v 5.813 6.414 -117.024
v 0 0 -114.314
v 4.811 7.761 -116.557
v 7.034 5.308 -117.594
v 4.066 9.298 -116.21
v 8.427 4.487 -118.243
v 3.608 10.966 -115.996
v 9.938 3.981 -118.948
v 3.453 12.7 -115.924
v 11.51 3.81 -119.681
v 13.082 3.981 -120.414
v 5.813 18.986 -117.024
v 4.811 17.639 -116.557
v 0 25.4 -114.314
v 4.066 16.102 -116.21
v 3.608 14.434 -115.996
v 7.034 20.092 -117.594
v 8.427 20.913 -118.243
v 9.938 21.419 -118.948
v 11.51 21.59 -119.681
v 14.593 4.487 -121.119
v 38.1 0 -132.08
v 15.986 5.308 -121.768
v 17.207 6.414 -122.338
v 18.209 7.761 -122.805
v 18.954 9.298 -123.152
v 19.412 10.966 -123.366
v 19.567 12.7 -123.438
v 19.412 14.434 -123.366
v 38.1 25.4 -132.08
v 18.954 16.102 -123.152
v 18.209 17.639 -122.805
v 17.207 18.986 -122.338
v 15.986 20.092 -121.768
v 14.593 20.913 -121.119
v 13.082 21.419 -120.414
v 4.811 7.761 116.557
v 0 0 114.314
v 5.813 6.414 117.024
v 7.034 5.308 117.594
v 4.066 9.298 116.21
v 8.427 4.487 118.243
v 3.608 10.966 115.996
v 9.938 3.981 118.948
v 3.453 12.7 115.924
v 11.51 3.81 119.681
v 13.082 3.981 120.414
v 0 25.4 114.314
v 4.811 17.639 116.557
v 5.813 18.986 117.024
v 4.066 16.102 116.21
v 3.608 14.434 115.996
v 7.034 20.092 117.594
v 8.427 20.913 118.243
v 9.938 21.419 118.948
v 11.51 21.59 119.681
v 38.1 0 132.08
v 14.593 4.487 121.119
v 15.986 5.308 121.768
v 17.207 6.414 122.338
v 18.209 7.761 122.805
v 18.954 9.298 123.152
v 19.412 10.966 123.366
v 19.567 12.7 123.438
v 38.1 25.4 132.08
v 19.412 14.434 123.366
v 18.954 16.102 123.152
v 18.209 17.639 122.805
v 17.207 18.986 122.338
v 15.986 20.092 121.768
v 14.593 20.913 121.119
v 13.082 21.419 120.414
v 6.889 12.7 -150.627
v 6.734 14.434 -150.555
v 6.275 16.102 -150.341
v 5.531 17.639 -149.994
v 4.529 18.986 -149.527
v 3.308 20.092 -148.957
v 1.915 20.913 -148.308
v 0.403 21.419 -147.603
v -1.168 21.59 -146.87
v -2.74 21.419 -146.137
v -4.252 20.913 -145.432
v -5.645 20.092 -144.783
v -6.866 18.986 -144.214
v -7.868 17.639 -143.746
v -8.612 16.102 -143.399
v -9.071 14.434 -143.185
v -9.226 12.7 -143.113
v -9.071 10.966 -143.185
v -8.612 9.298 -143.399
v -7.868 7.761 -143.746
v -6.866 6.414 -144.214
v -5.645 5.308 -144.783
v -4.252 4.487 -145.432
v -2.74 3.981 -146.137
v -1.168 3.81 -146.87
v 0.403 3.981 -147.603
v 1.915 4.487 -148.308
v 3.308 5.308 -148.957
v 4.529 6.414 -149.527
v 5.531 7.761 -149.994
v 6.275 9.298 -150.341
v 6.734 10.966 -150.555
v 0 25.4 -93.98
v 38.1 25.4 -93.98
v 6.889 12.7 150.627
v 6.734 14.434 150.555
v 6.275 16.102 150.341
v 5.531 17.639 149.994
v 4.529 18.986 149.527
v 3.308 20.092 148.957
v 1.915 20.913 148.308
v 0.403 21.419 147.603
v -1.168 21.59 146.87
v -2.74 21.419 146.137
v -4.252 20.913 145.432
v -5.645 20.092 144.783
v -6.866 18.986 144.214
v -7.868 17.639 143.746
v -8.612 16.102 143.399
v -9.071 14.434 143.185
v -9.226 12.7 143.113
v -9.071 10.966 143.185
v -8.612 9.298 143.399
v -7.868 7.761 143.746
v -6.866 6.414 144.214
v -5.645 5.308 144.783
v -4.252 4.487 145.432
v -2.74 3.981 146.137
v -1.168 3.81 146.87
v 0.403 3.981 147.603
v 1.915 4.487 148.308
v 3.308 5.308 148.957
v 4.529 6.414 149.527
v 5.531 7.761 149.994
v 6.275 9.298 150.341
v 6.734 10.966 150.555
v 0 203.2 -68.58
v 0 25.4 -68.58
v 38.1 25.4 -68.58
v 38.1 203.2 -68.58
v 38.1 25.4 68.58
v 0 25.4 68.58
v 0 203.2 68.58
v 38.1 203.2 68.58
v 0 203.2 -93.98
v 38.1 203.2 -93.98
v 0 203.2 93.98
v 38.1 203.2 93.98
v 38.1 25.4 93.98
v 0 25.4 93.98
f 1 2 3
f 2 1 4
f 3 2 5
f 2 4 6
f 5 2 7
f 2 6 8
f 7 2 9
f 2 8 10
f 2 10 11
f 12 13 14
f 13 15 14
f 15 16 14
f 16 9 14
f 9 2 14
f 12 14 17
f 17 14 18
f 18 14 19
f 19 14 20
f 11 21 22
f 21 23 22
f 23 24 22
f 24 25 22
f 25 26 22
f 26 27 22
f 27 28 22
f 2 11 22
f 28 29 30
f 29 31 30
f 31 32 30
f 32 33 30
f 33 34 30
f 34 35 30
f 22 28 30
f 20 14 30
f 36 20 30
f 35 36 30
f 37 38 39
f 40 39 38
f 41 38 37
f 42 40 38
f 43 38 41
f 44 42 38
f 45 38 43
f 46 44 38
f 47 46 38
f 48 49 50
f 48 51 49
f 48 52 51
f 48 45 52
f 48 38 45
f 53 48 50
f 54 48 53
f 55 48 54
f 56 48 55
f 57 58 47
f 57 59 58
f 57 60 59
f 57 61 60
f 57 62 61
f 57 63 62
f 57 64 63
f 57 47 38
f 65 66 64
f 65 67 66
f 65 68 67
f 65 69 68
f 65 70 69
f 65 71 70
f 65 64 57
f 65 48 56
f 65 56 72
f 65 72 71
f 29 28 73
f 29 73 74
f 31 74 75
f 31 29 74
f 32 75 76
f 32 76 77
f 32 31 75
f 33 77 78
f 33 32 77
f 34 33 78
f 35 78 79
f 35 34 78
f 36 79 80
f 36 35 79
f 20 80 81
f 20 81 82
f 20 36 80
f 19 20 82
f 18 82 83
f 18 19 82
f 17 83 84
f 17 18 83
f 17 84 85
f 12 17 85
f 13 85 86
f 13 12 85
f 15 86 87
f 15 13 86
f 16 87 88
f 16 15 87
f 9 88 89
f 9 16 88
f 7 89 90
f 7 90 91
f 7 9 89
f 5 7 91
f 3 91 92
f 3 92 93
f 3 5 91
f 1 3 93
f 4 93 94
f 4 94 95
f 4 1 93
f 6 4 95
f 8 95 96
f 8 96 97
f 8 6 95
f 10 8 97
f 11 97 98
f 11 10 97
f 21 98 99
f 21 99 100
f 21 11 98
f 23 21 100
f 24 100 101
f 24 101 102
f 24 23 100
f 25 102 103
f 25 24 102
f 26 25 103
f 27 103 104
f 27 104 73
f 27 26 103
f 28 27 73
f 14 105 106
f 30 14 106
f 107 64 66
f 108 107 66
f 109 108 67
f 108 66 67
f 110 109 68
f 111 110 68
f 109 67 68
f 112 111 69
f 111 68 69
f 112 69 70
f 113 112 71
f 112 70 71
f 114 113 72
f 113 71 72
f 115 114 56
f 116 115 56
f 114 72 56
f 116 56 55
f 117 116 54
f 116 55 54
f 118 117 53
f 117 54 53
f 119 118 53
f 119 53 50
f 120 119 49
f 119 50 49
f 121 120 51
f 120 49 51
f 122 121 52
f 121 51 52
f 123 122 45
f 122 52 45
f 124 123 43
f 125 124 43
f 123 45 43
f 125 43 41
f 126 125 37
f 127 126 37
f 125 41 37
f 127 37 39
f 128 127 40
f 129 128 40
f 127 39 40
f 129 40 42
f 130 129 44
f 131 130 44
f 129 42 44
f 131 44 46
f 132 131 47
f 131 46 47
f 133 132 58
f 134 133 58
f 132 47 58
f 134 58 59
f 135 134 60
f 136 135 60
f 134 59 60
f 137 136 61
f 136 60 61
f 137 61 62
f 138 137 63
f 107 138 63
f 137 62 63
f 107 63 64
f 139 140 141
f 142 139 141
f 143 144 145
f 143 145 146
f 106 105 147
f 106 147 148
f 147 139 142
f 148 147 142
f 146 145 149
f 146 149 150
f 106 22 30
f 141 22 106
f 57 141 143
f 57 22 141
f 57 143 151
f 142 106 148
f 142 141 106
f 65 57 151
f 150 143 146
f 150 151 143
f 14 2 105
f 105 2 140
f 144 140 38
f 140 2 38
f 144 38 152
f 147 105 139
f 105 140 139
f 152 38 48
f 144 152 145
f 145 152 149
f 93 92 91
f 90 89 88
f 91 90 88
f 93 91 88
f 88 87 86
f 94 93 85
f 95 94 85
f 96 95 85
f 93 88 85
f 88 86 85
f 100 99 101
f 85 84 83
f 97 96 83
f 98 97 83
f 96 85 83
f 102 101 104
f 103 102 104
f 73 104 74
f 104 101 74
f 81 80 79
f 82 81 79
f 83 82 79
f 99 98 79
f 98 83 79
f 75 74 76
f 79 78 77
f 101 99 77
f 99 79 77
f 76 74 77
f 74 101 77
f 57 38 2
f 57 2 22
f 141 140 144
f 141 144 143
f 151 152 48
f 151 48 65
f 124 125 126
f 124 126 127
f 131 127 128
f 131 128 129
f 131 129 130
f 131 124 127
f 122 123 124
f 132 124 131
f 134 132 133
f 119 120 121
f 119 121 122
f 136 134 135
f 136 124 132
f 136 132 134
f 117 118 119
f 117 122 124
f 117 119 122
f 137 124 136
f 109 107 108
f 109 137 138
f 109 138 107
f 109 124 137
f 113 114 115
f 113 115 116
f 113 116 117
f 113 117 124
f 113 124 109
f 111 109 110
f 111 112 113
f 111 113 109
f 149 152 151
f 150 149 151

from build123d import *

# Parameters (mm, degrees)
SKETCH1_W           = 38.1
SKETCH1_H           = 25.4
BOSS_EXTRUDE1_DEPTH = 132.08
SKETCH5_W           = 38.1
SKETCH5_H           = 25.4
BOSS_EXTRUDE3_DEPTH = 177.8
CUT_EXTRUDE1_DEPTH  = 25.4
SKETCH3_R           = 8.89
BOSS_EXTRUDE2_DEPTH = 30


with BuildPart() as part:
    # Sketch1 → Boss-Extrude1 (new body)
    with BuildSketch(Plane.XY):
        with Locations((19.05, 12.7)):
            Rectangle(SKETCH1_W, SKETCH1_H)
    boss_extrude1 = extrude(amount=BOSS_EXTRUDE1_DEPTH)

    # Sketch5 → Boss-Extrude3 (add)
    with BuildSketch(Plane(origin=(0, 25.4, 0), x_dir=(1, 0, 0), z_dir=(0, 1, 0))):
        with Locations((19.05, -81.28)):
            Rectangle(SKETCH5_W, SKETCH5_H)
    boss_extrude3 = extrude(amount=BOSS_EXTRUDE3_DEPTH)

    # Sketch2 → Cut-Extrude1 (cut)
    with BuildSketch(Plane(origin=(0, 25.4, 0), x_dir=(1, 0, 0), z_dir=(0, 1, 0))):
        Polygon((-12.106033358, -108.66854216), (38.1, -132.08), (54.824729612, -172.409676007), (-49.386286867, -161.765658866), align=None)
    cut_extrude1 = extrude(amount=-CUT_EXTRUDE1_DEPTH, mode=Mode.SUBTRACT)

    # Mirror2: Boss-Extrude1, Boss-Extrude3, Cut-Extrude1 across plane
    add(boss_extrude1.mirror(Plane(origin=(0, 0, 0), x_dir=(1, 0, 0), z_dir=(0, 0, -1))))
    add(boss_extrude3.mirror(Plane(origin=(0, 0, 0), x_dir=(1, 0, 0), z_dir=(0, 0, -1))))
    add(cut_extrude1.mirror(Plane(origin=(0, 0, 0), x_dir=(1, 0, 0), z_dir=(0, 0, -1))), mode=Mode.SUBTRACT)

    # Sketch3 → Boss-Extrude2 (add)
    with BuildSketch(Plane(origin=(-43.784678988, 0, 93.896547102), x_dir=(0.906307787, 0, 0.422618262), z_dir=(-0.422618262, 0, 0.906307787))):
        with Locations((61.011047984, 12.7)):
            Circle(SKETCH3_R)
    boss_extrude2 = extrude(amount=BOSS_EXTRUDE2_DEPTH)

    # Mirror3: Boss-Extrude2 across plane
    add(boss_extrude2.mirror(Plane.XY))


solid = part.part
